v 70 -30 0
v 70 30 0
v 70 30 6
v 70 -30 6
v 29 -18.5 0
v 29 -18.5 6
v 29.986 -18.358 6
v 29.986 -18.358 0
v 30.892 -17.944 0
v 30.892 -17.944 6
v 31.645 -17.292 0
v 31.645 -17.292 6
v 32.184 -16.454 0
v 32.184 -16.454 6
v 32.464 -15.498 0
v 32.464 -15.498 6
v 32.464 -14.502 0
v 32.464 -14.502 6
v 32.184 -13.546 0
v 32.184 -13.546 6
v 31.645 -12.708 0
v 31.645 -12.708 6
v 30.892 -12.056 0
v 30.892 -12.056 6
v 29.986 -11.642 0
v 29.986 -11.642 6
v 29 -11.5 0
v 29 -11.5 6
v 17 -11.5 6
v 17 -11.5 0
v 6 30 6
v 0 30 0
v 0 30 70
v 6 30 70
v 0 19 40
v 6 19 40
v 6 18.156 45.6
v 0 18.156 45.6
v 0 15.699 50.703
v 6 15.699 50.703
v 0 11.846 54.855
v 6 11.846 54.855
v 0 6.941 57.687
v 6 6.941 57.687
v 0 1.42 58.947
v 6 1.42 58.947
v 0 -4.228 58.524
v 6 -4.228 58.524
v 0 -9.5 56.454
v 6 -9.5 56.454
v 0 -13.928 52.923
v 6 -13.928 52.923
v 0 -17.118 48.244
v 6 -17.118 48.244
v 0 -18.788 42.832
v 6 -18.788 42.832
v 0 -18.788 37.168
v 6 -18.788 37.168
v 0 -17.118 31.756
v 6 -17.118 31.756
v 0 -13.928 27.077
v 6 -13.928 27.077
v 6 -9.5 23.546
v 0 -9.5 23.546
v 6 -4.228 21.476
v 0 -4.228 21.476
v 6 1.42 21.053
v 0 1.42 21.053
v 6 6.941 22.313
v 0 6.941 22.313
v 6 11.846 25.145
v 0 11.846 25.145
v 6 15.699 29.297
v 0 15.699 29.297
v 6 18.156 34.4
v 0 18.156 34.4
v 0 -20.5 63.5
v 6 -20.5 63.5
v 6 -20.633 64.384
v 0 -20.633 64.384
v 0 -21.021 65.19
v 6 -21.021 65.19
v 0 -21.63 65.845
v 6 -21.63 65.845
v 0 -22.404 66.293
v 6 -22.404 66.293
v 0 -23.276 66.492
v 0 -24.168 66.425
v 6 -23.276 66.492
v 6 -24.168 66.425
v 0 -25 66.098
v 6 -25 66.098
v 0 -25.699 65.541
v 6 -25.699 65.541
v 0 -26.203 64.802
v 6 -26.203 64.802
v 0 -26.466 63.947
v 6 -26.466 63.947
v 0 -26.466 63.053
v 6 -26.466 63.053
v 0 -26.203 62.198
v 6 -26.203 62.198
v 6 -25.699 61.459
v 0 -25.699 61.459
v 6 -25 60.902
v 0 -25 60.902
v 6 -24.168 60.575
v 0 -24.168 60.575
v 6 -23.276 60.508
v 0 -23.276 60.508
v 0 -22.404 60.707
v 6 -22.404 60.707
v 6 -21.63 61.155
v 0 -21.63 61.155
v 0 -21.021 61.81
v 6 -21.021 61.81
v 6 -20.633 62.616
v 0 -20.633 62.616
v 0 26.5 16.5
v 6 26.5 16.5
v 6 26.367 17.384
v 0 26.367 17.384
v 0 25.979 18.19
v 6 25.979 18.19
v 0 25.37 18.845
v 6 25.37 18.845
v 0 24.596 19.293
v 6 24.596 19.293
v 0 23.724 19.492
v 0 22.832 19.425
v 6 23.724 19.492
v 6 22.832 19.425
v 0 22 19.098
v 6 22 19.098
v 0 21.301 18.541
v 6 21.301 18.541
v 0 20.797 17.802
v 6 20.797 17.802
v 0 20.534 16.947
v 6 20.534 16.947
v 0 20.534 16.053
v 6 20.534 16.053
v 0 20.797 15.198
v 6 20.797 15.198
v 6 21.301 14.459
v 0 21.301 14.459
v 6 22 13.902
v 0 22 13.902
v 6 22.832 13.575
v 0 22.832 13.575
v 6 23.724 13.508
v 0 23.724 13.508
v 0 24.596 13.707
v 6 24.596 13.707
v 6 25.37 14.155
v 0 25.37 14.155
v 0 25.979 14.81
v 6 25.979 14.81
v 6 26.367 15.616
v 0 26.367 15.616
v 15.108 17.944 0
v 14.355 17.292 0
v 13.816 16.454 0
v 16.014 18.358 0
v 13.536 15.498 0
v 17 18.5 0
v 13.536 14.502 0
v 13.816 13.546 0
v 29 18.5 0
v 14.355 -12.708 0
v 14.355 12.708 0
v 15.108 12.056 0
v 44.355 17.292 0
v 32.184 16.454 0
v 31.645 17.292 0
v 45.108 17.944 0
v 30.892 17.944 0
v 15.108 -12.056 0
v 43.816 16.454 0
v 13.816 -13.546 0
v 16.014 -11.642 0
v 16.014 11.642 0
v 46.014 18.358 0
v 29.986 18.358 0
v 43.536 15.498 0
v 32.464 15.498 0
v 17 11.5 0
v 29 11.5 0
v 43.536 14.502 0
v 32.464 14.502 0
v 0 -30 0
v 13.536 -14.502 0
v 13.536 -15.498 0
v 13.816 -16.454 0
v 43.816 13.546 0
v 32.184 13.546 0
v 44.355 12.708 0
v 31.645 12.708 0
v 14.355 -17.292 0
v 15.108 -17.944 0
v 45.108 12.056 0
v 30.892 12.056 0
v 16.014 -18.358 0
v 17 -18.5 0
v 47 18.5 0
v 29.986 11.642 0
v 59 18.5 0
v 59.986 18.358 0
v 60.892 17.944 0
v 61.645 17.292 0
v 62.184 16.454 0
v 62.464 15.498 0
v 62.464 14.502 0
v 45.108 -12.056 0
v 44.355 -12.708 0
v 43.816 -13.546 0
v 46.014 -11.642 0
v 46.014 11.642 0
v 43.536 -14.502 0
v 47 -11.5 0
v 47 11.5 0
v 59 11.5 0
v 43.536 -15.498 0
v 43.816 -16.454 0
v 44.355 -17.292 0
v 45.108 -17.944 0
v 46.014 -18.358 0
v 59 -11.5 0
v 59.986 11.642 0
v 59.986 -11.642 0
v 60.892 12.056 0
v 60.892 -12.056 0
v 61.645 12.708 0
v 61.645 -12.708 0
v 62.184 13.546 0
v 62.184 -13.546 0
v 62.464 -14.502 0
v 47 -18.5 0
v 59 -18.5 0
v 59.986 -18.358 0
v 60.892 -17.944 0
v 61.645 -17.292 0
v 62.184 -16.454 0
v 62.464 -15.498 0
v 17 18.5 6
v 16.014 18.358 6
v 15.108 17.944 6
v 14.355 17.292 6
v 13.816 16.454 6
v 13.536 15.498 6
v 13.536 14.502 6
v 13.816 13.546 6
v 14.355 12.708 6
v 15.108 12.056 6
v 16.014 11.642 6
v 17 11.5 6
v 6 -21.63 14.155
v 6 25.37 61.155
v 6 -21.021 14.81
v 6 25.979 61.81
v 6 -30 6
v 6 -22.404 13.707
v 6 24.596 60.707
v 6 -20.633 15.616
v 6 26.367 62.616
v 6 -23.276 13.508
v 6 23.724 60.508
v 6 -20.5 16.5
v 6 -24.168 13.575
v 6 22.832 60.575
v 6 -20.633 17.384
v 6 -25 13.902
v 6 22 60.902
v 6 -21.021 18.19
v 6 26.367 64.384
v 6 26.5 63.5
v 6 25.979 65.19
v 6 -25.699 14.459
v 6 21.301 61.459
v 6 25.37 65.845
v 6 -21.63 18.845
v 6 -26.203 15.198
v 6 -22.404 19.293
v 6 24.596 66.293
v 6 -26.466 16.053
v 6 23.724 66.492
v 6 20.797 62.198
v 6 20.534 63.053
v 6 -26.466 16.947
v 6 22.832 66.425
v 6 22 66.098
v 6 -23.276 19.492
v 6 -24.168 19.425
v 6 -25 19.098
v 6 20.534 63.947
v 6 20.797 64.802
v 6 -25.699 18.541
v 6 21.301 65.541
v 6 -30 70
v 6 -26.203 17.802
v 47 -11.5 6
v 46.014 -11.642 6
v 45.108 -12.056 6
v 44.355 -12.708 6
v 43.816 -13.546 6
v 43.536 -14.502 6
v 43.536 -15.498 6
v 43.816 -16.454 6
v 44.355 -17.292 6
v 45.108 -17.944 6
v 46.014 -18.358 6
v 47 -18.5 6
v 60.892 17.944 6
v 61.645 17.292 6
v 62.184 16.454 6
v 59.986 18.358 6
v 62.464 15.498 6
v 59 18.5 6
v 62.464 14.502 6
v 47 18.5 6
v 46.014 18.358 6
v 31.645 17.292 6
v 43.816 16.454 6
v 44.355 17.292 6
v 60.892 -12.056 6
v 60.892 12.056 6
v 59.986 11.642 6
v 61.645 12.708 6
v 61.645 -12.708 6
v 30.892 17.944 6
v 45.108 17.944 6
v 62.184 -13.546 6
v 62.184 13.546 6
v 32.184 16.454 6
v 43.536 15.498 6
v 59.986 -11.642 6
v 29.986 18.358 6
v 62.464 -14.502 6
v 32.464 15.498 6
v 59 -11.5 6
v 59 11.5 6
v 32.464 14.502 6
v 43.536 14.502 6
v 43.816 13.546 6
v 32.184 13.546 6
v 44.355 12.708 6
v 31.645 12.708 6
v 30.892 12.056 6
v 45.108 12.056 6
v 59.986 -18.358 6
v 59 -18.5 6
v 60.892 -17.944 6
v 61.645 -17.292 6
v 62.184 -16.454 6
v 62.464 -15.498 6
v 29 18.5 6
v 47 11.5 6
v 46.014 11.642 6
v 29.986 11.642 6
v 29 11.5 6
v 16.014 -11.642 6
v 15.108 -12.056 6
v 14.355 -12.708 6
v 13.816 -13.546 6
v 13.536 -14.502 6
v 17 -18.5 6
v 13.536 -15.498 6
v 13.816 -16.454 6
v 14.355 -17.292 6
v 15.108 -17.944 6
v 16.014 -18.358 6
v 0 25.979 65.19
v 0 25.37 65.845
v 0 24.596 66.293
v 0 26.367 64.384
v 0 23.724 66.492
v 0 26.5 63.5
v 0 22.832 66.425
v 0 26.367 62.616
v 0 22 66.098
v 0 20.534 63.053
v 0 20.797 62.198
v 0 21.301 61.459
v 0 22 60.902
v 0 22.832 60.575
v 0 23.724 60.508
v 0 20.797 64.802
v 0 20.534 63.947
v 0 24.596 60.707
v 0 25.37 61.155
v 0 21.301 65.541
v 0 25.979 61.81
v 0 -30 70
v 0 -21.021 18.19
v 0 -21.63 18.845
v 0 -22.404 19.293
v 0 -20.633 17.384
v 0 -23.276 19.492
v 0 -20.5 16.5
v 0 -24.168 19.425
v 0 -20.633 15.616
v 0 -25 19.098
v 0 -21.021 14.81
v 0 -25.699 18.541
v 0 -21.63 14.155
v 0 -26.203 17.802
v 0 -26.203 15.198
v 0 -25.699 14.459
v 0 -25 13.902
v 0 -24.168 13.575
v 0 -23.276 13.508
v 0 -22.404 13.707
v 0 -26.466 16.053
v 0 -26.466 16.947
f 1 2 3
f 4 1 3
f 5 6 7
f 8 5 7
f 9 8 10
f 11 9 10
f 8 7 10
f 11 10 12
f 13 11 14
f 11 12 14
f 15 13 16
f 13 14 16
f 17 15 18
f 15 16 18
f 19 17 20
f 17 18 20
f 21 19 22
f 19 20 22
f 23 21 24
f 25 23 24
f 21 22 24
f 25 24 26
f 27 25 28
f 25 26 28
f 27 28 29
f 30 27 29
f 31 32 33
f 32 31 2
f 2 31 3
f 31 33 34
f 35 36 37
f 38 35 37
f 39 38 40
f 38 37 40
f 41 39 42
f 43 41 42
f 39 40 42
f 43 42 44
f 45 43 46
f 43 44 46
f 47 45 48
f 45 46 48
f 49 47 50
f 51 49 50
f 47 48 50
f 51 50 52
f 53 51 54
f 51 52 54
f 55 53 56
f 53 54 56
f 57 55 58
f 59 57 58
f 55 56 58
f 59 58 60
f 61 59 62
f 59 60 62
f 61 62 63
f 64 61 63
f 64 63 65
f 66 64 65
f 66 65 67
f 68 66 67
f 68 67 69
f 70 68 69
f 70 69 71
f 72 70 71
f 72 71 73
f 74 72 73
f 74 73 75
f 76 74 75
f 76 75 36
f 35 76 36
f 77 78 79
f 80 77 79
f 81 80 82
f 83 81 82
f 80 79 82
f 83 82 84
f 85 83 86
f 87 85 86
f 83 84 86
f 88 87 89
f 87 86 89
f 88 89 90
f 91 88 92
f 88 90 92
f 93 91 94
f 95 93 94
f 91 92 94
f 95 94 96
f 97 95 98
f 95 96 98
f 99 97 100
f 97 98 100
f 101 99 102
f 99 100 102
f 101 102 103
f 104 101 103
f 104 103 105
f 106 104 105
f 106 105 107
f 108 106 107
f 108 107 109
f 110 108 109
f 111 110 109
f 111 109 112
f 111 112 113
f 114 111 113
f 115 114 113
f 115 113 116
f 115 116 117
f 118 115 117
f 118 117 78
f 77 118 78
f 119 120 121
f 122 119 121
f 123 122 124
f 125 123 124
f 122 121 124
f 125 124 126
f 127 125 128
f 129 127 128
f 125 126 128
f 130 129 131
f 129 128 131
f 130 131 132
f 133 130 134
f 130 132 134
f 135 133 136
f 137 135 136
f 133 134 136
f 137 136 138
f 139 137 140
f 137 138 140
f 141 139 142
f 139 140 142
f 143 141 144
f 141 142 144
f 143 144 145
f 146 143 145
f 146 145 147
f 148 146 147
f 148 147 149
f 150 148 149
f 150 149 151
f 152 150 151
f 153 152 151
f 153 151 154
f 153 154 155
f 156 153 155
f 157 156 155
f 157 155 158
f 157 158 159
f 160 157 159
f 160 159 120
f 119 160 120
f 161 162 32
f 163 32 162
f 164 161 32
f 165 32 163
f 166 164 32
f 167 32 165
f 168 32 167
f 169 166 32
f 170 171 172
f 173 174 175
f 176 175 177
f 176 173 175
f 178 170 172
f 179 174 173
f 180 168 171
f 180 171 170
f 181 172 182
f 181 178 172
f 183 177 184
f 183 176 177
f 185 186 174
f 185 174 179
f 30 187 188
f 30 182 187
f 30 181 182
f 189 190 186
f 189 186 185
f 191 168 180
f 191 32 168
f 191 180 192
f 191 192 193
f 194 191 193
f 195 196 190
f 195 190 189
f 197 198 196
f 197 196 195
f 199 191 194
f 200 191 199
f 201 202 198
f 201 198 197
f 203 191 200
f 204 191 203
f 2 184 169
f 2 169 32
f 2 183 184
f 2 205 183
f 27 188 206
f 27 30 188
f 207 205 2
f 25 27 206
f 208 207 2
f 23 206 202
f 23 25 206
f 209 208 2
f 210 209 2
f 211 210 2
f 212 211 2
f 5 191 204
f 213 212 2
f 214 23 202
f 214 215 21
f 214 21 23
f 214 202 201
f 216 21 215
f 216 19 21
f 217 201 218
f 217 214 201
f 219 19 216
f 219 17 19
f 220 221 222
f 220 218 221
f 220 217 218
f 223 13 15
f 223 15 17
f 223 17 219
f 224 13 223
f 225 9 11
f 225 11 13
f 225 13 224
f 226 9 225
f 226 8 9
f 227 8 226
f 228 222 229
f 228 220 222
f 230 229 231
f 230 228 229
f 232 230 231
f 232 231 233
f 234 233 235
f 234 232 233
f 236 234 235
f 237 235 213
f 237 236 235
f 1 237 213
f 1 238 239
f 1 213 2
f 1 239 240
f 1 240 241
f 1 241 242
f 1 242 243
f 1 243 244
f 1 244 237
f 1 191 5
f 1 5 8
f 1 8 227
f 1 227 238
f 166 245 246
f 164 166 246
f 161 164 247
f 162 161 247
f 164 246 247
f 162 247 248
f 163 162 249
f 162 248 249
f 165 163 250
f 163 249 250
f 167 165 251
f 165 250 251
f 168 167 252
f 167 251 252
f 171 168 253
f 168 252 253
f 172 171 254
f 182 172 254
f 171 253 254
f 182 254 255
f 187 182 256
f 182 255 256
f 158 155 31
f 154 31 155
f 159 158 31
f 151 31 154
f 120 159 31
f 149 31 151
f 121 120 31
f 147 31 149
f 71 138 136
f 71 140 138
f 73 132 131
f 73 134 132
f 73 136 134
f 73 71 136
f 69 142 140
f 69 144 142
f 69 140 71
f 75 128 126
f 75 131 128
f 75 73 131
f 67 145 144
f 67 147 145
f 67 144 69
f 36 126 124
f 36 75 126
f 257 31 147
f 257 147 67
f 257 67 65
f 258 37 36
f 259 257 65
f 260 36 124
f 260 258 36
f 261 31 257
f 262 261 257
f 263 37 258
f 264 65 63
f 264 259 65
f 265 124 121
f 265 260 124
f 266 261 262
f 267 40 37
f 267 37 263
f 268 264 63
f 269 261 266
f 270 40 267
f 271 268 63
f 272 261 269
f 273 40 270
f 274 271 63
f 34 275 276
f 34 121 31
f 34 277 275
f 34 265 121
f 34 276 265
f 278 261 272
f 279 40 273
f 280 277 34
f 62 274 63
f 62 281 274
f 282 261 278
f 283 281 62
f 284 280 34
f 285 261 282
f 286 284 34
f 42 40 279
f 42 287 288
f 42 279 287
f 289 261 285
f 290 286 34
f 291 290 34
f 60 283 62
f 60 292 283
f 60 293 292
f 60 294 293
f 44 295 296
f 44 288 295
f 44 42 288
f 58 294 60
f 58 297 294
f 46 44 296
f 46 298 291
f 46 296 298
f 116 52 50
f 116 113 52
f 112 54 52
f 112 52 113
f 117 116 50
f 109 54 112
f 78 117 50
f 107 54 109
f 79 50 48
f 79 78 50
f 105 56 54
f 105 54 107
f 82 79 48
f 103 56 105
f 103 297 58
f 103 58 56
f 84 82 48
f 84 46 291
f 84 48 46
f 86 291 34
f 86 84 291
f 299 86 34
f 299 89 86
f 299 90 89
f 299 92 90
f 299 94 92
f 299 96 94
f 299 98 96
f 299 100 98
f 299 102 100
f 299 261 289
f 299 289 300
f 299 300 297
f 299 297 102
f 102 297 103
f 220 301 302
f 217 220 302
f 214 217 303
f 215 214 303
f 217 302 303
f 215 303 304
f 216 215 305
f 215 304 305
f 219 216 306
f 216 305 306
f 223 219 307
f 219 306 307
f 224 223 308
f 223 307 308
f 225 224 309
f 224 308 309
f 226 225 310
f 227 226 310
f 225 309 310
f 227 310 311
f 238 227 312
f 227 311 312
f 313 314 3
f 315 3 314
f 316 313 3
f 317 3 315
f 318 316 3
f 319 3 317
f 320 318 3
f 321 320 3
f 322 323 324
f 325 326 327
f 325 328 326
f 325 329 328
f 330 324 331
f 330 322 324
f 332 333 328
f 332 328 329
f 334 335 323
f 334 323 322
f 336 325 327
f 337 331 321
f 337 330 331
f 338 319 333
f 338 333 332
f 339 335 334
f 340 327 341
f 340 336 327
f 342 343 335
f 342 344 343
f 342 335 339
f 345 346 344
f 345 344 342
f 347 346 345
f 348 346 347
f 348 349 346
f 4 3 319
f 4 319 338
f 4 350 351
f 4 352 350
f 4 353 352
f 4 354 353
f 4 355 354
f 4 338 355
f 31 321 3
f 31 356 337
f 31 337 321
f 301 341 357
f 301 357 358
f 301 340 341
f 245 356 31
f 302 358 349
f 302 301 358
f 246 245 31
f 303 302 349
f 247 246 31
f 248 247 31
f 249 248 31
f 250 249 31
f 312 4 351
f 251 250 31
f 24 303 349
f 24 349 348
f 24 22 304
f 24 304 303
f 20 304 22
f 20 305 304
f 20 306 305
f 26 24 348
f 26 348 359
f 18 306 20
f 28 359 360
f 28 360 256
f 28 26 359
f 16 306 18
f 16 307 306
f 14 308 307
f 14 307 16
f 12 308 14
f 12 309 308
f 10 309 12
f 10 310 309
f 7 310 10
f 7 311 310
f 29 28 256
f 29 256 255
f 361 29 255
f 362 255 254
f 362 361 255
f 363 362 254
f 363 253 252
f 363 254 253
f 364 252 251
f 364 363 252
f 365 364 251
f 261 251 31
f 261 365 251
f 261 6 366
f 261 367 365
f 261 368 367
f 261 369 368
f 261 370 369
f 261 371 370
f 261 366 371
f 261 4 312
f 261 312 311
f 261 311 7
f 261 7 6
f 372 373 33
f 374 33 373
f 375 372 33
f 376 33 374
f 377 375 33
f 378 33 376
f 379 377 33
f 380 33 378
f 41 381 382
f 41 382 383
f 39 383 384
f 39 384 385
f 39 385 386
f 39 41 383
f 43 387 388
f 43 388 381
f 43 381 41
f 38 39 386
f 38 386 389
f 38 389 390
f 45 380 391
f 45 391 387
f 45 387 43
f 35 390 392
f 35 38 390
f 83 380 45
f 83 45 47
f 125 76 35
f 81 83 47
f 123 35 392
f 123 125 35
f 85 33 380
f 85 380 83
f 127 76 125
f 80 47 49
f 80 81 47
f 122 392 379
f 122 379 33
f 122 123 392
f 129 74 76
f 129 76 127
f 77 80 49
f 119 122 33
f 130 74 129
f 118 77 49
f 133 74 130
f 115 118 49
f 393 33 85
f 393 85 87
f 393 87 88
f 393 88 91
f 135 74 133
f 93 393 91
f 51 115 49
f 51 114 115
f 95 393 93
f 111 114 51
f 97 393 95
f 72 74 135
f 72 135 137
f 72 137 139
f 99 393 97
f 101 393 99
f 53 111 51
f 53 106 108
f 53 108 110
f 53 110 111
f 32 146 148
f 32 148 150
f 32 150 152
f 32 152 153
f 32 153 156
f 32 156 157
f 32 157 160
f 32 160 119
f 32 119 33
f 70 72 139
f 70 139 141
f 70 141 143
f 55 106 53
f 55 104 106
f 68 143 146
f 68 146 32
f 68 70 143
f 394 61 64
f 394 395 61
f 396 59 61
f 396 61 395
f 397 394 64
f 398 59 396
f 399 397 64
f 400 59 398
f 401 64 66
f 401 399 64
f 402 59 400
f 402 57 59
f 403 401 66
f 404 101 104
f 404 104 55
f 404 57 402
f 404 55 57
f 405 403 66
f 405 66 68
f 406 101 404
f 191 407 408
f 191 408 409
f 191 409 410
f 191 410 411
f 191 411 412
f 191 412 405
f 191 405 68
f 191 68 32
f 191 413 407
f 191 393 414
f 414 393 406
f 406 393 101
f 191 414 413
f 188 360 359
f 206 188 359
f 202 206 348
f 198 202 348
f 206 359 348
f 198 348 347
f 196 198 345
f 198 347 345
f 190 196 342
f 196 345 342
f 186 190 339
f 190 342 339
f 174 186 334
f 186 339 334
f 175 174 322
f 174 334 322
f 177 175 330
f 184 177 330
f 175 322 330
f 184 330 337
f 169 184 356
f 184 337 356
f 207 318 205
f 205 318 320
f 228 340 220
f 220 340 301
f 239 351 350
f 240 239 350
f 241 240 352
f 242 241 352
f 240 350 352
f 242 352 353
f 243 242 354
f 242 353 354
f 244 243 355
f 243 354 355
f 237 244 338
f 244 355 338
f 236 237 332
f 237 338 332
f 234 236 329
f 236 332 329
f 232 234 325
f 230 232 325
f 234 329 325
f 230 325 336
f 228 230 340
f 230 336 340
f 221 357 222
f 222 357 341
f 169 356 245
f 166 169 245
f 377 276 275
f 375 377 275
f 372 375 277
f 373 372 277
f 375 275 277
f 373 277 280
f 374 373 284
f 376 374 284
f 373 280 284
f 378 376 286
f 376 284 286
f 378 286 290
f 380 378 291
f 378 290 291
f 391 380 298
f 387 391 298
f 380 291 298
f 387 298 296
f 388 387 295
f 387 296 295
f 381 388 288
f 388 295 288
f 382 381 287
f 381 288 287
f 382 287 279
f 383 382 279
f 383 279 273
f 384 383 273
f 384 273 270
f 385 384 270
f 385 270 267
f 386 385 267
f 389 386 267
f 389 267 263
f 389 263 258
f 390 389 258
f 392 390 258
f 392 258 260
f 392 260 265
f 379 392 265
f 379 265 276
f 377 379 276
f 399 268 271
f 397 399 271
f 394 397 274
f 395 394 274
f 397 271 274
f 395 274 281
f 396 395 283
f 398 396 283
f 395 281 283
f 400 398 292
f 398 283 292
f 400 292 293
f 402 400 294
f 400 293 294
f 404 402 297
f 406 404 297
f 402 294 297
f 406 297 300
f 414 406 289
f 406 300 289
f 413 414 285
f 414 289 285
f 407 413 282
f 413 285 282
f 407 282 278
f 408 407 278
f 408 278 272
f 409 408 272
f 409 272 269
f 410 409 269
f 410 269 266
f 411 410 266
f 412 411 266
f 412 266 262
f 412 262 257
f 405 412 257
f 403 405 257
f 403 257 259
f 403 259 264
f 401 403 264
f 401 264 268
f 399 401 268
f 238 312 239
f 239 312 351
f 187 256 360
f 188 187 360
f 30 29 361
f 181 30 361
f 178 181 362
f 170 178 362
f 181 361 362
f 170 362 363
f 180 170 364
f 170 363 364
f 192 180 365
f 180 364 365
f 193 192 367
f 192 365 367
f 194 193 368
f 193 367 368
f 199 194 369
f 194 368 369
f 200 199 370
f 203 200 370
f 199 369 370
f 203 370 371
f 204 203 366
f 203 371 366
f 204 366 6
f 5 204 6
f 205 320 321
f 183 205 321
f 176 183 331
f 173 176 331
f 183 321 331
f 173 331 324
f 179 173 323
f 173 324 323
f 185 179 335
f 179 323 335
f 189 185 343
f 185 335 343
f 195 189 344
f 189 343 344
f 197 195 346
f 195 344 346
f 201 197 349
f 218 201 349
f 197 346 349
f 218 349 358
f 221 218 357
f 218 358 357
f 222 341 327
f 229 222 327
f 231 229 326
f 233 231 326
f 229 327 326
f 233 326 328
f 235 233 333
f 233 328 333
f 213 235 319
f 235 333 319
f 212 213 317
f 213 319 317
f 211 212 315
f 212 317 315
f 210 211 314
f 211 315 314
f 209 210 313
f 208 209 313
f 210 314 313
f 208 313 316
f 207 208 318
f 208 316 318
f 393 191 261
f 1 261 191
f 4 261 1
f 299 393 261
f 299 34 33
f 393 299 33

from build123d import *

# Parameters (mm, degrees)
F1_DEPTH      = 30
F1_DEPTH_BACK = 30
F2_R          = 19
F2_R_2        = 3
F3_DEPTH      = 6.001
F5_DEPTH      = 25


with BuildPart() as f1:
    # F0 (on Front) → F1 (new body, two sides)
    with BuildSketch(Plane.XZ) as f1_sk:
        Polygon((0, 70), (0, 0), (70, 0), (70, 6), (6, 6), (6, 70), align=None)
    extrude(amount=F1_DEPTH)
    extrude(f1_sk.sketch, amount=-F1_DEPTH_BACK)

    # F2 (on face) → F3 (cut, through all)
    with BuildSketch(Plane.YZ.offset(6)):
        with Locations((0, 40)):
            Circle(F2_R)
        with Locations((-23.5, 63.5)):
            Circle(F2_R_2)
        with Locations((-23.5, 16.5)):
            Circle(F2_R_2)
        with Locations((23.5, 16.5)):
            Circle(F2_R_2)
        with Locations((23.5, 63.5)):
            Circle(F2_R_2)
    extrude(amount=-F3_DEPTH, mode=Mode.SUBTRACT)

    # F4 (on face) → F5 (cut)
    with BuildSketch(Plane.XY.offset(6)):
        with BuildLine():
            ThreePointArc((29, -18.5), (32.5, -15), (29, -11.5))
            Line((29, -11.5), (17, -11.5))
            ThreePointArc((17, -11.5), (13.5, -15), (17, -18.5))
            Line((17, -18.5), (29, -18.5))
        make_face()
        with BuildLine():
            ThreePointArc((59, -18.5), (62.5, -15), (59, -11.5))
            Line((59, -11.5), (47, -11.5))
            ThreePointArc((47, -11.5), (43.5, -15), (47, -18.5))
            Line((47, -18.5), (59, -18.5))
        make_face()
        with BuildLine():
            Line((47, 11.5), (59, 11.5))
            ThreePointArc((59, 11.5), (62.5, 15), (59, 18.5))
            Line((59, 18.5), (47, 18.5))
            ThreePointArc((47, 18.5), (43.5, 15), (47, 11.5))
        make_face()
        with BuildLine():
            ThreePointArc((29, 11.5), (32.5, 15), (29, 18.5))
            Line((29, 18.5), (17, 18.5))
            ThreePointArc((17, 18.5), (13.5, 15), (17, 11.5))
            Line((17, 11.5), (29, 11.5))
        make_face()
    extrude(amount=-F5_DEPTH, mode=Mode.SUBTRACT)


solid = f1.part
